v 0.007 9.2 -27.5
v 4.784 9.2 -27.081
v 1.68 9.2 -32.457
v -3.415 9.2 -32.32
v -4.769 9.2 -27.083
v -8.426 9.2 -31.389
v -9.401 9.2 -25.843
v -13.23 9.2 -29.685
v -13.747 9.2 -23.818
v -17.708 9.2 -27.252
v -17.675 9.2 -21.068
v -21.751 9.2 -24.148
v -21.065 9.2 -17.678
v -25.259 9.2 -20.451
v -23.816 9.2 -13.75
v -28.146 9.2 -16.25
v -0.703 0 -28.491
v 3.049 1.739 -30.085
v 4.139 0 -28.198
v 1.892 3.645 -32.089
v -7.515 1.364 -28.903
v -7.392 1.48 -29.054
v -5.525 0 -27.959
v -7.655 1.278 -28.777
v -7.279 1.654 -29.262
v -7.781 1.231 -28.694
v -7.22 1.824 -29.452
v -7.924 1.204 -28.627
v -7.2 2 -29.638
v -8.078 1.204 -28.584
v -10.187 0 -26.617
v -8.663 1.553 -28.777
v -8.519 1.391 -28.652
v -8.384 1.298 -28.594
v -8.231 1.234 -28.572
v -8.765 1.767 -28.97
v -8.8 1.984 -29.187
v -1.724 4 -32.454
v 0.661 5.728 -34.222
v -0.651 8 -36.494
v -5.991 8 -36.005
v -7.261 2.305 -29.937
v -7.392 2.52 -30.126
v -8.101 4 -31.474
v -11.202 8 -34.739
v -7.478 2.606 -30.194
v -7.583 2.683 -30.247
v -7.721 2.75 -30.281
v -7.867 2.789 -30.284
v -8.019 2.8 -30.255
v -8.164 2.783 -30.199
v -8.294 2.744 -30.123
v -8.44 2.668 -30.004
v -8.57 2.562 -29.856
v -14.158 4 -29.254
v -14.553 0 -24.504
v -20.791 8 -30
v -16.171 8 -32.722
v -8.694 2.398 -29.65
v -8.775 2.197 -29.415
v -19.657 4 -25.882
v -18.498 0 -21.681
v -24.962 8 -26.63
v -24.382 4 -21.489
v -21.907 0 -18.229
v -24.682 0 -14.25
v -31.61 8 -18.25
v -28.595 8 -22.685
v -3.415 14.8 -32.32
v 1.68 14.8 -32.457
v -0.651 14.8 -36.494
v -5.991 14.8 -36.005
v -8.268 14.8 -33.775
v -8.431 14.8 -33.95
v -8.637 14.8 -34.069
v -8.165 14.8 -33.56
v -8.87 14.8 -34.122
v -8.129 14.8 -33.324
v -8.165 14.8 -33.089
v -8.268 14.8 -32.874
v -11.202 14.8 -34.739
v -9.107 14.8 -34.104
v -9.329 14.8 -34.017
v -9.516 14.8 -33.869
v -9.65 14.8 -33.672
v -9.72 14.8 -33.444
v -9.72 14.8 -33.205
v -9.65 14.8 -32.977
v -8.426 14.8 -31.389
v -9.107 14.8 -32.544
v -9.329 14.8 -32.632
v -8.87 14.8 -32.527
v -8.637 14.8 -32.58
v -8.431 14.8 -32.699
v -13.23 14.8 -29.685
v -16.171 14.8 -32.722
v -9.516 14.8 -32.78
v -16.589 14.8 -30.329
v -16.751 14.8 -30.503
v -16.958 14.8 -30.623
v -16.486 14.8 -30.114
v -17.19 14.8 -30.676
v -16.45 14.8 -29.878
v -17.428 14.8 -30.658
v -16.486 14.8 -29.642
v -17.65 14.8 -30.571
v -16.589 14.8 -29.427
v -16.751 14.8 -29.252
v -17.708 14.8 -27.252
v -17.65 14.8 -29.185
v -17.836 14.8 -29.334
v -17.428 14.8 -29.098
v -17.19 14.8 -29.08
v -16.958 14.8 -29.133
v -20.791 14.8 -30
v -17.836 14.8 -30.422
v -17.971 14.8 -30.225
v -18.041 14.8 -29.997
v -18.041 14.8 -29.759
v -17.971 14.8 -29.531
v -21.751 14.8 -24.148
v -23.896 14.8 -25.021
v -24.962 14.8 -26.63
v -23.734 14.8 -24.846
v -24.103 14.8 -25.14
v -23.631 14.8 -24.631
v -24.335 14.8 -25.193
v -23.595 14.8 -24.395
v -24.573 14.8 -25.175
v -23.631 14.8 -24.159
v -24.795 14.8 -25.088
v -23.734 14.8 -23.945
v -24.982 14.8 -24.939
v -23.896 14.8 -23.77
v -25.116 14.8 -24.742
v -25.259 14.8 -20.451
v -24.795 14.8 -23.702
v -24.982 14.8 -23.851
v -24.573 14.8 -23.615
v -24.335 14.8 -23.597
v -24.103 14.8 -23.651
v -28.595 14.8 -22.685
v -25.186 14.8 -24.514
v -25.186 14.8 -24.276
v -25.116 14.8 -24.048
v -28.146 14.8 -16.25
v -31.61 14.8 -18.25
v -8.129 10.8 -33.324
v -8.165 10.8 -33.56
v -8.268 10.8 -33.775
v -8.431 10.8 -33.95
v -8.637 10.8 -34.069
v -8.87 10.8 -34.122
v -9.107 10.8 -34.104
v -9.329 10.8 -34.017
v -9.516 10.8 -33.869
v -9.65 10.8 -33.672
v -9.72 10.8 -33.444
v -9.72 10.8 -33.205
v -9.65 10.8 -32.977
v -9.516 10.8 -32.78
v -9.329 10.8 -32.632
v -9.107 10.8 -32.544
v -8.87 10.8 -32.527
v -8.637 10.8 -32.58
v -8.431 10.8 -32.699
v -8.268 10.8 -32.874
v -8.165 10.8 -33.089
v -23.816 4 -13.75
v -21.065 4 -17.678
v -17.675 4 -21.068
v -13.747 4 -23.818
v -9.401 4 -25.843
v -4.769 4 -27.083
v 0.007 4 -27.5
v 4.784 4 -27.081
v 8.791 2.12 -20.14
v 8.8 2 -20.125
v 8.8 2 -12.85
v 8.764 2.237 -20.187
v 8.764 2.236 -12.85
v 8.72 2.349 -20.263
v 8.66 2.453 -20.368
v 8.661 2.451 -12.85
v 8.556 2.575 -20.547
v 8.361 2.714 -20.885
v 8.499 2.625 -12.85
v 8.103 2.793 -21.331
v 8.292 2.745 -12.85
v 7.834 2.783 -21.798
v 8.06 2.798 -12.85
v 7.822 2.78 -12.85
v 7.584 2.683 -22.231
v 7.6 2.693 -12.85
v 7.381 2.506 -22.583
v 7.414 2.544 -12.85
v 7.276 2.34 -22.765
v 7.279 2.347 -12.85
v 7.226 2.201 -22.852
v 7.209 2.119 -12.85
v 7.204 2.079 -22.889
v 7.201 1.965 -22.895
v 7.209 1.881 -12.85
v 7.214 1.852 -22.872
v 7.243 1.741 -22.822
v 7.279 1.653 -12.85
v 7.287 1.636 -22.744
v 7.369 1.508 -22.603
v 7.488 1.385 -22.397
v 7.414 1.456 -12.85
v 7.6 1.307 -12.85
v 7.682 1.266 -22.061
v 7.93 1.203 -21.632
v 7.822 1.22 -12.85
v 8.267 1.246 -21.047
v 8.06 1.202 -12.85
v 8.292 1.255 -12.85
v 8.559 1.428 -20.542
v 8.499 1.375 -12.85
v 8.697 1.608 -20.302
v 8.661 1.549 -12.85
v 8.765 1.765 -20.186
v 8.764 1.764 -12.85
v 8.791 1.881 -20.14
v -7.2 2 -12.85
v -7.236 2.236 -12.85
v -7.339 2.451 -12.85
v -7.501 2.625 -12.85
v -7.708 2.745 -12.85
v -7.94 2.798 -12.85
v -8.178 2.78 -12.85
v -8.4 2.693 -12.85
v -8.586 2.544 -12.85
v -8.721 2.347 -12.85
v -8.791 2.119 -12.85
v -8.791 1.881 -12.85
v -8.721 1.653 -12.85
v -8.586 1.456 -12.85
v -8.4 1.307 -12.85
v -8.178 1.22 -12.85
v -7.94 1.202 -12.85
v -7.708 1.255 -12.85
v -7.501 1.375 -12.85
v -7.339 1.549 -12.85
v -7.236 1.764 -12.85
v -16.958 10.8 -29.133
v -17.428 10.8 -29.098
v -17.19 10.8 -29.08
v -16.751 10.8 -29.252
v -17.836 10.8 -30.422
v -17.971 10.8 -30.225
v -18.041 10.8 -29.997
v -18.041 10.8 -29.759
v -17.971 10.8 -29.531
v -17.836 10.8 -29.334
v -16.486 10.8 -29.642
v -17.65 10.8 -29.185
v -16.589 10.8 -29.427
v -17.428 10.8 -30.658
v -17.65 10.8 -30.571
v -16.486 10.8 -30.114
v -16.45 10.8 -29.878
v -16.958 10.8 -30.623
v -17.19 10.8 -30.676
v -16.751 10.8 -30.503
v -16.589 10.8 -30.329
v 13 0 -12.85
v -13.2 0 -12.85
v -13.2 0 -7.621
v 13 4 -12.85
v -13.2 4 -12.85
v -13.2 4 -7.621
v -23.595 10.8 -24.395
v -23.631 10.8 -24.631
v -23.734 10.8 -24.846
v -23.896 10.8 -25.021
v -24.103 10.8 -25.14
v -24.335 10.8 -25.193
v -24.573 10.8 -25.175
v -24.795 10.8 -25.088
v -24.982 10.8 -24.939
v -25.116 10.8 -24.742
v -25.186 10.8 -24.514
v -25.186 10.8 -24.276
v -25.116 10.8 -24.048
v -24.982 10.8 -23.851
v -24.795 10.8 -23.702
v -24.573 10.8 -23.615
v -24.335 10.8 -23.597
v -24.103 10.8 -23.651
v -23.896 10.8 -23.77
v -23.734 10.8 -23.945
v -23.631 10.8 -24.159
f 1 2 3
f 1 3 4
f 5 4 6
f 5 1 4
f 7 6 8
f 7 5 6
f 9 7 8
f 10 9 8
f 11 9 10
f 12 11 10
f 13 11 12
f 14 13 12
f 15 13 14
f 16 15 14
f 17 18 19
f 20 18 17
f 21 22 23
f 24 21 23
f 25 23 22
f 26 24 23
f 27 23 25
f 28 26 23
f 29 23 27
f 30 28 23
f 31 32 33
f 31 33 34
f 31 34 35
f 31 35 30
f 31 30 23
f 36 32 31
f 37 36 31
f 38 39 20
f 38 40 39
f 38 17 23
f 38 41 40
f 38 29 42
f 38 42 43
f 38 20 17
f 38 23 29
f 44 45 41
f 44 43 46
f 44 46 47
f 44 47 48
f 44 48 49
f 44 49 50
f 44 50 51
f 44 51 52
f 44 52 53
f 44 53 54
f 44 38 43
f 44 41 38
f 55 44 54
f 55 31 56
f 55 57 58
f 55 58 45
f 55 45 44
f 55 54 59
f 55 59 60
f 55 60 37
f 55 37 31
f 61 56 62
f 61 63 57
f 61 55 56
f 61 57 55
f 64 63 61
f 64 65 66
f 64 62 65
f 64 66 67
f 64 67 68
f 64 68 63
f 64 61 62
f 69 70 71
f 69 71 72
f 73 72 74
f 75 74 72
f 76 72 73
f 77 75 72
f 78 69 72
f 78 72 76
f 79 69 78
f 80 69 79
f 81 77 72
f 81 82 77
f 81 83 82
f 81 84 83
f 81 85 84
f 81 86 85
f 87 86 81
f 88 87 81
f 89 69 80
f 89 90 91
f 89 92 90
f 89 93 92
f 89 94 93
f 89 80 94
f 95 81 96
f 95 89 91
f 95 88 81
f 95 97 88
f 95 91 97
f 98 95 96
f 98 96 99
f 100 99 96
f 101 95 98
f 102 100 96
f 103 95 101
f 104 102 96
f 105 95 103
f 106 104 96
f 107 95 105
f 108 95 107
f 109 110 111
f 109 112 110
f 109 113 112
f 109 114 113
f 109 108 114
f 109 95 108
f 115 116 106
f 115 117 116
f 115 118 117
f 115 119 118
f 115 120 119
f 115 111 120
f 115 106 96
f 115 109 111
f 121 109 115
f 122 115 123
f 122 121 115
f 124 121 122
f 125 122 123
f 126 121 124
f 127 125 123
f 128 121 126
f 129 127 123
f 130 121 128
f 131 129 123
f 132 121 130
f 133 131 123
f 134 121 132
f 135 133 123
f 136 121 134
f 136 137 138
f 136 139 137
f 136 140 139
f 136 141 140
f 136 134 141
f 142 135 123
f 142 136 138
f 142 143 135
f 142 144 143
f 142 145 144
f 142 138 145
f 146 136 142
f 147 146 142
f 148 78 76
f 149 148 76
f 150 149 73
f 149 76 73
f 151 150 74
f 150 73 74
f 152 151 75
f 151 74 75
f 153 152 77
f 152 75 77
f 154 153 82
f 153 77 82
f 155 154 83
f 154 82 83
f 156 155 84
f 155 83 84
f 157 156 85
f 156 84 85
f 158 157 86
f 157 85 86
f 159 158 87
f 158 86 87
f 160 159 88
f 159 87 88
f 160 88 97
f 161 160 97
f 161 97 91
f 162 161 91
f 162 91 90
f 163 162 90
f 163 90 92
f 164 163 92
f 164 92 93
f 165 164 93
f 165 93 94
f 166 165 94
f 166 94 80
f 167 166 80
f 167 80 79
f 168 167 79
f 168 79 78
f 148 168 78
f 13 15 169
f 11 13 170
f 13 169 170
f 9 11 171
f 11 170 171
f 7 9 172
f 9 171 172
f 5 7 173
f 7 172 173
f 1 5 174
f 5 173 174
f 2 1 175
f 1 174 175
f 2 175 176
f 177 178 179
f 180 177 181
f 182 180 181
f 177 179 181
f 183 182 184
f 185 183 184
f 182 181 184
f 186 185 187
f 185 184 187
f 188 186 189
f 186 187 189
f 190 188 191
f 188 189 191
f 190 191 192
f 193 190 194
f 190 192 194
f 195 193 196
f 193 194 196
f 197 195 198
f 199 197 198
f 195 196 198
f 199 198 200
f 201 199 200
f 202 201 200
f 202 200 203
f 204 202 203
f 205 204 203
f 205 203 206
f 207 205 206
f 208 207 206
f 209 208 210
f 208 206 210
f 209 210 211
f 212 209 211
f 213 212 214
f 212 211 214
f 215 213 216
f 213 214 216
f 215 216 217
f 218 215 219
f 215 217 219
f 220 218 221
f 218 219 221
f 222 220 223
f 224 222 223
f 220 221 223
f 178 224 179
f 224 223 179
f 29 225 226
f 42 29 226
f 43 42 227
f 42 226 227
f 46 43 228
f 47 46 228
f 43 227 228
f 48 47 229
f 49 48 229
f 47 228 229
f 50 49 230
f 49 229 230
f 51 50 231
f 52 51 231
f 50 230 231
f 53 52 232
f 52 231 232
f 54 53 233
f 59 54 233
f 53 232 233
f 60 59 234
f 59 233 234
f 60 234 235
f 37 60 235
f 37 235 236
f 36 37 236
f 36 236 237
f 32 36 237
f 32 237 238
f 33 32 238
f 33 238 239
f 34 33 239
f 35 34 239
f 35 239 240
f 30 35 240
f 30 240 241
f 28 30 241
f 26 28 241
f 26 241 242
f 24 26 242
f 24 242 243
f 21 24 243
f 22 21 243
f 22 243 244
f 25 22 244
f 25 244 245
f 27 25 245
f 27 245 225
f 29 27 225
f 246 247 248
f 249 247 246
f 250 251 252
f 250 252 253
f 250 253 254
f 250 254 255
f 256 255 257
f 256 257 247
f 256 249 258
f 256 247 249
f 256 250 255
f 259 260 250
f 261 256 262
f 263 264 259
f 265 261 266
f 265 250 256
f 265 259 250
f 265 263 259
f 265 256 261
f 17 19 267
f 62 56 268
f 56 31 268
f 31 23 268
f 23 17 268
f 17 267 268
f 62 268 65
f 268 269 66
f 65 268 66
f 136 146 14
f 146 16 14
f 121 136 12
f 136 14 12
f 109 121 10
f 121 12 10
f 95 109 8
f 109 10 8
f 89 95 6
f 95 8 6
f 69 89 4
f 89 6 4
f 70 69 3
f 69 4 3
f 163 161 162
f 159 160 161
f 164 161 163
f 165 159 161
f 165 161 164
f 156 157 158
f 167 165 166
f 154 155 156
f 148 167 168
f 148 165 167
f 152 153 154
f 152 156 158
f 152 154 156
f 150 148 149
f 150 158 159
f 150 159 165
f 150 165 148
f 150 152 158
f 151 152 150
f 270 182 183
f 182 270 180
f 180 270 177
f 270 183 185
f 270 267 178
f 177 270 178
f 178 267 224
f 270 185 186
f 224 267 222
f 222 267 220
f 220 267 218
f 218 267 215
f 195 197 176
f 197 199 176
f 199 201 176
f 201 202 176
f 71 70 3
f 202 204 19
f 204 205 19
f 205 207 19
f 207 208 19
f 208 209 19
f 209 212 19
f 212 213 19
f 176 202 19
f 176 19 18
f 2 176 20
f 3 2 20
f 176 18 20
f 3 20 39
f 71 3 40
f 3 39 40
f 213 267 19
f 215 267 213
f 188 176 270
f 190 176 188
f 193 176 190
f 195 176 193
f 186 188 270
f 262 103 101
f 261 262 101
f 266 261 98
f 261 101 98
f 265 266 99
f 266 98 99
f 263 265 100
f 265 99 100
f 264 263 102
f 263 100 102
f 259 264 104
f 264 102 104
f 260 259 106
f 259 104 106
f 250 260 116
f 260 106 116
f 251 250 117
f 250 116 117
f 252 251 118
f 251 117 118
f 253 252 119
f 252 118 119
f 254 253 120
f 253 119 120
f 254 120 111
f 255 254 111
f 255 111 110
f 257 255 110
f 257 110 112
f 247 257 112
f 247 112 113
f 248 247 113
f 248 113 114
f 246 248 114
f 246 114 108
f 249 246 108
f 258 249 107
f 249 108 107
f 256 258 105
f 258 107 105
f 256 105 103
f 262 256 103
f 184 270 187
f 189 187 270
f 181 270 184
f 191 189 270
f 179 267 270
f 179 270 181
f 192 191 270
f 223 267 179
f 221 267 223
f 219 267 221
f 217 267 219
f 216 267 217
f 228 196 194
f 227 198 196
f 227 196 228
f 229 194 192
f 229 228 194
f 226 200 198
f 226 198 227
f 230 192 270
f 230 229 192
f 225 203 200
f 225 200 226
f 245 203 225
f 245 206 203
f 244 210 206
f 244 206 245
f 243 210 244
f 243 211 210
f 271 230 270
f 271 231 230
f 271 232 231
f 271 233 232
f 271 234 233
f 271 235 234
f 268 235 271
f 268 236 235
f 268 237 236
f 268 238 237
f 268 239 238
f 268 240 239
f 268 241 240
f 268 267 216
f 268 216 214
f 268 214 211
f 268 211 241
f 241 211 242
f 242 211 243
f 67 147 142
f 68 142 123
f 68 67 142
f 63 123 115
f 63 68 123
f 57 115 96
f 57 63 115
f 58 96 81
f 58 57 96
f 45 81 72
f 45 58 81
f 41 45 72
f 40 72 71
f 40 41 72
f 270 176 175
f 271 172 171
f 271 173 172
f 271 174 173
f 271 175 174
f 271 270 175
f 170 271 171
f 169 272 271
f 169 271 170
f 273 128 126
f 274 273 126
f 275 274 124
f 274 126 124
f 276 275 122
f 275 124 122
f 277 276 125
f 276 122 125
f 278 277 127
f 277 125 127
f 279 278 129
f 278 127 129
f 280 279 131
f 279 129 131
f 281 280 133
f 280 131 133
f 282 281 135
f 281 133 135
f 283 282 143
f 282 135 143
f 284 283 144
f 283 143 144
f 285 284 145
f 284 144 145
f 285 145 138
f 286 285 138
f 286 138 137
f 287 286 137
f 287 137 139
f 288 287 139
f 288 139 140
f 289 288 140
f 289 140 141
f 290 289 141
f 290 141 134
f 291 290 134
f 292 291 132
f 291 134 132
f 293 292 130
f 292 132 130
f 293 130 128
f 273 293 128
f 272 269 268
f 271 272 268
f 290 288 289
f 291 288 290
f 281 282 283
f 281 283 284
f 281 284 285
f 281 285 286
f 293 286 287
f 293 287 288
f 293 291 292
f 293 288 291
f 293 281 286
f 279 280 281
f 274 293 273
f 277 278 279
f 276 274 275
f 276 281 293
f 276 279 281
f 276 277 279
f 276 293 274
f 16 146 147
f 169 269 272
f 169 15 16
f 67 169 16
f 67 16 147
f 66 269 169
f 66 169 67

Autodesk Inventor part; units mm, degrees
ref_plane "YZ Plane" through (0, 0, 0) normal (1, 0, 0) x (0, 1, 0)
ref_plane "XZ Plane" through (0, 0, 0) normal (0, 1, 0) x (-1, 0, 0)
ref_plane "XY Plane" through (0, 0, 0) normal (0, 0, 1) x (1, 0, 0)
sketch "スケッチ1" plane through (0, 0, 0) normal (0, 1, 0) x (-1, 0, 0)
  circle A0 centre (0, 0) radius 27.5
  line L0 (13, 12.85) -> (-13, 12.85)
  line L1 (-13, 12.85) -> (-13, -12.85)
  line L2 (-13, -12.85) -> (13, -12.85)
  line L3 (13, -12.85) -> (13, 12.85)
  circle A1 centre (0, 0) radius 32.5
  circle A2 centre (0, 0) radius 36.5
  line L4 (0, 0) -> (18.4986, -32.0406)
  line L5 (0, 0) -> (31.6099, -18.25)
  line L6 (-13, -12.85) -> (0.651, -36.4942)
  line L7 (13.2, 12.8507) -> (13.2, -12.85)
  line L8 (13.2, -12.85) -> (13, -12.85)
  point P0 (13, 0)
  point P1 (0, 12.85)
  point P2 (13, -34.1065)
  point P3 (-13, -34.1065)
  point P4 (28.1458, -16.25)
  point P5 (13, -7.5056)
  point P6 (18.25, -31.6099)
  point P7 (16.25, -28.1458)
  point P8 (23.8157, -13.75)
  point P9 (-4.7839, -27.0807)
  point P10 (-1.6802, -32.4565)
  point P11 (13.2, -7.621)
  dimension "d0" = 55
  dimension "d1" = 12.85
  dimension "d2" = 26
  dimension "d3" = 5
  dimension "d4" = 4
  dimension "d11" = 60
  dimension "d12" = 30
  dimension "d16" = 0.2
extrude "押し出し1" add sketch "スケッチ1" along normal blind 4 contours L6 L2 L4 A0 | A0 L4 A1 L6 | L5 A1 L4 A0 | A0 L4 L2 L8 L7 L5 | A1 L4 A2 L6 | L5 A2 L4 A1
extrude "押し出し2" add sketch "スケッチ1" along normal blind 9.2 contours A0 L4 A1 L6 | L5 A1 L4 A0
extrude "押し出し3" add sketch "スケッチ1" along normal blind 14.8 contours A1 L4 A2 L6 | L5 A2 L4 A1
chamfer "面取り1" distance 8 angle 45 1 edges at (-18.5312, 0, -31.4459)
sketch "スケッチ2" plane through (-13.2, 0, -12.85) normal (0, 0, 1) x (1, 0, 0)
  circle A0 centre (21.2, 2) radius 0.8 projected
  circle A1 centre (5.2, 2) radius 0.8 projected
  point P0 (13.2, 0)
extrude "押し出し4" cut sketch "スケッチ2" against normal through all
sketch "スケッチ4" plane through (0, 14.8, 0) normal (0, 1, 0) x (1, 0, 0)
  circle A0 centre (-24.3952, 24.3952) radius 0.8 projected
  line L0 (4.7839, 27.0807) -> (-0.651, 36.4942) projected
  arc A1 (-0.651, 36.4942) -> (-31.6099, 18.25) centre (0, 0) ccw projected
  line L1 (-31.6099, 18.25) -> (-23.8157, 13.75) projected
  arc A2 (4.7839, 27.0807) -> (-23.8157, 13.75) centre (0, 0) ccw projected
  circle A3 centre (-17.25, 29.8779) radius 0.8 projected
  circle A4 centre (-8.9293, 33.3244) radius 0.8 projected
  circle A5 centre (-24.3952, 24.3952) radius 0.8 projected
extrude "押し出し6" cut sketch "スケッチ4" against normal blind 4 contours A0 | A3 | A4
properties part number "waist_side"
